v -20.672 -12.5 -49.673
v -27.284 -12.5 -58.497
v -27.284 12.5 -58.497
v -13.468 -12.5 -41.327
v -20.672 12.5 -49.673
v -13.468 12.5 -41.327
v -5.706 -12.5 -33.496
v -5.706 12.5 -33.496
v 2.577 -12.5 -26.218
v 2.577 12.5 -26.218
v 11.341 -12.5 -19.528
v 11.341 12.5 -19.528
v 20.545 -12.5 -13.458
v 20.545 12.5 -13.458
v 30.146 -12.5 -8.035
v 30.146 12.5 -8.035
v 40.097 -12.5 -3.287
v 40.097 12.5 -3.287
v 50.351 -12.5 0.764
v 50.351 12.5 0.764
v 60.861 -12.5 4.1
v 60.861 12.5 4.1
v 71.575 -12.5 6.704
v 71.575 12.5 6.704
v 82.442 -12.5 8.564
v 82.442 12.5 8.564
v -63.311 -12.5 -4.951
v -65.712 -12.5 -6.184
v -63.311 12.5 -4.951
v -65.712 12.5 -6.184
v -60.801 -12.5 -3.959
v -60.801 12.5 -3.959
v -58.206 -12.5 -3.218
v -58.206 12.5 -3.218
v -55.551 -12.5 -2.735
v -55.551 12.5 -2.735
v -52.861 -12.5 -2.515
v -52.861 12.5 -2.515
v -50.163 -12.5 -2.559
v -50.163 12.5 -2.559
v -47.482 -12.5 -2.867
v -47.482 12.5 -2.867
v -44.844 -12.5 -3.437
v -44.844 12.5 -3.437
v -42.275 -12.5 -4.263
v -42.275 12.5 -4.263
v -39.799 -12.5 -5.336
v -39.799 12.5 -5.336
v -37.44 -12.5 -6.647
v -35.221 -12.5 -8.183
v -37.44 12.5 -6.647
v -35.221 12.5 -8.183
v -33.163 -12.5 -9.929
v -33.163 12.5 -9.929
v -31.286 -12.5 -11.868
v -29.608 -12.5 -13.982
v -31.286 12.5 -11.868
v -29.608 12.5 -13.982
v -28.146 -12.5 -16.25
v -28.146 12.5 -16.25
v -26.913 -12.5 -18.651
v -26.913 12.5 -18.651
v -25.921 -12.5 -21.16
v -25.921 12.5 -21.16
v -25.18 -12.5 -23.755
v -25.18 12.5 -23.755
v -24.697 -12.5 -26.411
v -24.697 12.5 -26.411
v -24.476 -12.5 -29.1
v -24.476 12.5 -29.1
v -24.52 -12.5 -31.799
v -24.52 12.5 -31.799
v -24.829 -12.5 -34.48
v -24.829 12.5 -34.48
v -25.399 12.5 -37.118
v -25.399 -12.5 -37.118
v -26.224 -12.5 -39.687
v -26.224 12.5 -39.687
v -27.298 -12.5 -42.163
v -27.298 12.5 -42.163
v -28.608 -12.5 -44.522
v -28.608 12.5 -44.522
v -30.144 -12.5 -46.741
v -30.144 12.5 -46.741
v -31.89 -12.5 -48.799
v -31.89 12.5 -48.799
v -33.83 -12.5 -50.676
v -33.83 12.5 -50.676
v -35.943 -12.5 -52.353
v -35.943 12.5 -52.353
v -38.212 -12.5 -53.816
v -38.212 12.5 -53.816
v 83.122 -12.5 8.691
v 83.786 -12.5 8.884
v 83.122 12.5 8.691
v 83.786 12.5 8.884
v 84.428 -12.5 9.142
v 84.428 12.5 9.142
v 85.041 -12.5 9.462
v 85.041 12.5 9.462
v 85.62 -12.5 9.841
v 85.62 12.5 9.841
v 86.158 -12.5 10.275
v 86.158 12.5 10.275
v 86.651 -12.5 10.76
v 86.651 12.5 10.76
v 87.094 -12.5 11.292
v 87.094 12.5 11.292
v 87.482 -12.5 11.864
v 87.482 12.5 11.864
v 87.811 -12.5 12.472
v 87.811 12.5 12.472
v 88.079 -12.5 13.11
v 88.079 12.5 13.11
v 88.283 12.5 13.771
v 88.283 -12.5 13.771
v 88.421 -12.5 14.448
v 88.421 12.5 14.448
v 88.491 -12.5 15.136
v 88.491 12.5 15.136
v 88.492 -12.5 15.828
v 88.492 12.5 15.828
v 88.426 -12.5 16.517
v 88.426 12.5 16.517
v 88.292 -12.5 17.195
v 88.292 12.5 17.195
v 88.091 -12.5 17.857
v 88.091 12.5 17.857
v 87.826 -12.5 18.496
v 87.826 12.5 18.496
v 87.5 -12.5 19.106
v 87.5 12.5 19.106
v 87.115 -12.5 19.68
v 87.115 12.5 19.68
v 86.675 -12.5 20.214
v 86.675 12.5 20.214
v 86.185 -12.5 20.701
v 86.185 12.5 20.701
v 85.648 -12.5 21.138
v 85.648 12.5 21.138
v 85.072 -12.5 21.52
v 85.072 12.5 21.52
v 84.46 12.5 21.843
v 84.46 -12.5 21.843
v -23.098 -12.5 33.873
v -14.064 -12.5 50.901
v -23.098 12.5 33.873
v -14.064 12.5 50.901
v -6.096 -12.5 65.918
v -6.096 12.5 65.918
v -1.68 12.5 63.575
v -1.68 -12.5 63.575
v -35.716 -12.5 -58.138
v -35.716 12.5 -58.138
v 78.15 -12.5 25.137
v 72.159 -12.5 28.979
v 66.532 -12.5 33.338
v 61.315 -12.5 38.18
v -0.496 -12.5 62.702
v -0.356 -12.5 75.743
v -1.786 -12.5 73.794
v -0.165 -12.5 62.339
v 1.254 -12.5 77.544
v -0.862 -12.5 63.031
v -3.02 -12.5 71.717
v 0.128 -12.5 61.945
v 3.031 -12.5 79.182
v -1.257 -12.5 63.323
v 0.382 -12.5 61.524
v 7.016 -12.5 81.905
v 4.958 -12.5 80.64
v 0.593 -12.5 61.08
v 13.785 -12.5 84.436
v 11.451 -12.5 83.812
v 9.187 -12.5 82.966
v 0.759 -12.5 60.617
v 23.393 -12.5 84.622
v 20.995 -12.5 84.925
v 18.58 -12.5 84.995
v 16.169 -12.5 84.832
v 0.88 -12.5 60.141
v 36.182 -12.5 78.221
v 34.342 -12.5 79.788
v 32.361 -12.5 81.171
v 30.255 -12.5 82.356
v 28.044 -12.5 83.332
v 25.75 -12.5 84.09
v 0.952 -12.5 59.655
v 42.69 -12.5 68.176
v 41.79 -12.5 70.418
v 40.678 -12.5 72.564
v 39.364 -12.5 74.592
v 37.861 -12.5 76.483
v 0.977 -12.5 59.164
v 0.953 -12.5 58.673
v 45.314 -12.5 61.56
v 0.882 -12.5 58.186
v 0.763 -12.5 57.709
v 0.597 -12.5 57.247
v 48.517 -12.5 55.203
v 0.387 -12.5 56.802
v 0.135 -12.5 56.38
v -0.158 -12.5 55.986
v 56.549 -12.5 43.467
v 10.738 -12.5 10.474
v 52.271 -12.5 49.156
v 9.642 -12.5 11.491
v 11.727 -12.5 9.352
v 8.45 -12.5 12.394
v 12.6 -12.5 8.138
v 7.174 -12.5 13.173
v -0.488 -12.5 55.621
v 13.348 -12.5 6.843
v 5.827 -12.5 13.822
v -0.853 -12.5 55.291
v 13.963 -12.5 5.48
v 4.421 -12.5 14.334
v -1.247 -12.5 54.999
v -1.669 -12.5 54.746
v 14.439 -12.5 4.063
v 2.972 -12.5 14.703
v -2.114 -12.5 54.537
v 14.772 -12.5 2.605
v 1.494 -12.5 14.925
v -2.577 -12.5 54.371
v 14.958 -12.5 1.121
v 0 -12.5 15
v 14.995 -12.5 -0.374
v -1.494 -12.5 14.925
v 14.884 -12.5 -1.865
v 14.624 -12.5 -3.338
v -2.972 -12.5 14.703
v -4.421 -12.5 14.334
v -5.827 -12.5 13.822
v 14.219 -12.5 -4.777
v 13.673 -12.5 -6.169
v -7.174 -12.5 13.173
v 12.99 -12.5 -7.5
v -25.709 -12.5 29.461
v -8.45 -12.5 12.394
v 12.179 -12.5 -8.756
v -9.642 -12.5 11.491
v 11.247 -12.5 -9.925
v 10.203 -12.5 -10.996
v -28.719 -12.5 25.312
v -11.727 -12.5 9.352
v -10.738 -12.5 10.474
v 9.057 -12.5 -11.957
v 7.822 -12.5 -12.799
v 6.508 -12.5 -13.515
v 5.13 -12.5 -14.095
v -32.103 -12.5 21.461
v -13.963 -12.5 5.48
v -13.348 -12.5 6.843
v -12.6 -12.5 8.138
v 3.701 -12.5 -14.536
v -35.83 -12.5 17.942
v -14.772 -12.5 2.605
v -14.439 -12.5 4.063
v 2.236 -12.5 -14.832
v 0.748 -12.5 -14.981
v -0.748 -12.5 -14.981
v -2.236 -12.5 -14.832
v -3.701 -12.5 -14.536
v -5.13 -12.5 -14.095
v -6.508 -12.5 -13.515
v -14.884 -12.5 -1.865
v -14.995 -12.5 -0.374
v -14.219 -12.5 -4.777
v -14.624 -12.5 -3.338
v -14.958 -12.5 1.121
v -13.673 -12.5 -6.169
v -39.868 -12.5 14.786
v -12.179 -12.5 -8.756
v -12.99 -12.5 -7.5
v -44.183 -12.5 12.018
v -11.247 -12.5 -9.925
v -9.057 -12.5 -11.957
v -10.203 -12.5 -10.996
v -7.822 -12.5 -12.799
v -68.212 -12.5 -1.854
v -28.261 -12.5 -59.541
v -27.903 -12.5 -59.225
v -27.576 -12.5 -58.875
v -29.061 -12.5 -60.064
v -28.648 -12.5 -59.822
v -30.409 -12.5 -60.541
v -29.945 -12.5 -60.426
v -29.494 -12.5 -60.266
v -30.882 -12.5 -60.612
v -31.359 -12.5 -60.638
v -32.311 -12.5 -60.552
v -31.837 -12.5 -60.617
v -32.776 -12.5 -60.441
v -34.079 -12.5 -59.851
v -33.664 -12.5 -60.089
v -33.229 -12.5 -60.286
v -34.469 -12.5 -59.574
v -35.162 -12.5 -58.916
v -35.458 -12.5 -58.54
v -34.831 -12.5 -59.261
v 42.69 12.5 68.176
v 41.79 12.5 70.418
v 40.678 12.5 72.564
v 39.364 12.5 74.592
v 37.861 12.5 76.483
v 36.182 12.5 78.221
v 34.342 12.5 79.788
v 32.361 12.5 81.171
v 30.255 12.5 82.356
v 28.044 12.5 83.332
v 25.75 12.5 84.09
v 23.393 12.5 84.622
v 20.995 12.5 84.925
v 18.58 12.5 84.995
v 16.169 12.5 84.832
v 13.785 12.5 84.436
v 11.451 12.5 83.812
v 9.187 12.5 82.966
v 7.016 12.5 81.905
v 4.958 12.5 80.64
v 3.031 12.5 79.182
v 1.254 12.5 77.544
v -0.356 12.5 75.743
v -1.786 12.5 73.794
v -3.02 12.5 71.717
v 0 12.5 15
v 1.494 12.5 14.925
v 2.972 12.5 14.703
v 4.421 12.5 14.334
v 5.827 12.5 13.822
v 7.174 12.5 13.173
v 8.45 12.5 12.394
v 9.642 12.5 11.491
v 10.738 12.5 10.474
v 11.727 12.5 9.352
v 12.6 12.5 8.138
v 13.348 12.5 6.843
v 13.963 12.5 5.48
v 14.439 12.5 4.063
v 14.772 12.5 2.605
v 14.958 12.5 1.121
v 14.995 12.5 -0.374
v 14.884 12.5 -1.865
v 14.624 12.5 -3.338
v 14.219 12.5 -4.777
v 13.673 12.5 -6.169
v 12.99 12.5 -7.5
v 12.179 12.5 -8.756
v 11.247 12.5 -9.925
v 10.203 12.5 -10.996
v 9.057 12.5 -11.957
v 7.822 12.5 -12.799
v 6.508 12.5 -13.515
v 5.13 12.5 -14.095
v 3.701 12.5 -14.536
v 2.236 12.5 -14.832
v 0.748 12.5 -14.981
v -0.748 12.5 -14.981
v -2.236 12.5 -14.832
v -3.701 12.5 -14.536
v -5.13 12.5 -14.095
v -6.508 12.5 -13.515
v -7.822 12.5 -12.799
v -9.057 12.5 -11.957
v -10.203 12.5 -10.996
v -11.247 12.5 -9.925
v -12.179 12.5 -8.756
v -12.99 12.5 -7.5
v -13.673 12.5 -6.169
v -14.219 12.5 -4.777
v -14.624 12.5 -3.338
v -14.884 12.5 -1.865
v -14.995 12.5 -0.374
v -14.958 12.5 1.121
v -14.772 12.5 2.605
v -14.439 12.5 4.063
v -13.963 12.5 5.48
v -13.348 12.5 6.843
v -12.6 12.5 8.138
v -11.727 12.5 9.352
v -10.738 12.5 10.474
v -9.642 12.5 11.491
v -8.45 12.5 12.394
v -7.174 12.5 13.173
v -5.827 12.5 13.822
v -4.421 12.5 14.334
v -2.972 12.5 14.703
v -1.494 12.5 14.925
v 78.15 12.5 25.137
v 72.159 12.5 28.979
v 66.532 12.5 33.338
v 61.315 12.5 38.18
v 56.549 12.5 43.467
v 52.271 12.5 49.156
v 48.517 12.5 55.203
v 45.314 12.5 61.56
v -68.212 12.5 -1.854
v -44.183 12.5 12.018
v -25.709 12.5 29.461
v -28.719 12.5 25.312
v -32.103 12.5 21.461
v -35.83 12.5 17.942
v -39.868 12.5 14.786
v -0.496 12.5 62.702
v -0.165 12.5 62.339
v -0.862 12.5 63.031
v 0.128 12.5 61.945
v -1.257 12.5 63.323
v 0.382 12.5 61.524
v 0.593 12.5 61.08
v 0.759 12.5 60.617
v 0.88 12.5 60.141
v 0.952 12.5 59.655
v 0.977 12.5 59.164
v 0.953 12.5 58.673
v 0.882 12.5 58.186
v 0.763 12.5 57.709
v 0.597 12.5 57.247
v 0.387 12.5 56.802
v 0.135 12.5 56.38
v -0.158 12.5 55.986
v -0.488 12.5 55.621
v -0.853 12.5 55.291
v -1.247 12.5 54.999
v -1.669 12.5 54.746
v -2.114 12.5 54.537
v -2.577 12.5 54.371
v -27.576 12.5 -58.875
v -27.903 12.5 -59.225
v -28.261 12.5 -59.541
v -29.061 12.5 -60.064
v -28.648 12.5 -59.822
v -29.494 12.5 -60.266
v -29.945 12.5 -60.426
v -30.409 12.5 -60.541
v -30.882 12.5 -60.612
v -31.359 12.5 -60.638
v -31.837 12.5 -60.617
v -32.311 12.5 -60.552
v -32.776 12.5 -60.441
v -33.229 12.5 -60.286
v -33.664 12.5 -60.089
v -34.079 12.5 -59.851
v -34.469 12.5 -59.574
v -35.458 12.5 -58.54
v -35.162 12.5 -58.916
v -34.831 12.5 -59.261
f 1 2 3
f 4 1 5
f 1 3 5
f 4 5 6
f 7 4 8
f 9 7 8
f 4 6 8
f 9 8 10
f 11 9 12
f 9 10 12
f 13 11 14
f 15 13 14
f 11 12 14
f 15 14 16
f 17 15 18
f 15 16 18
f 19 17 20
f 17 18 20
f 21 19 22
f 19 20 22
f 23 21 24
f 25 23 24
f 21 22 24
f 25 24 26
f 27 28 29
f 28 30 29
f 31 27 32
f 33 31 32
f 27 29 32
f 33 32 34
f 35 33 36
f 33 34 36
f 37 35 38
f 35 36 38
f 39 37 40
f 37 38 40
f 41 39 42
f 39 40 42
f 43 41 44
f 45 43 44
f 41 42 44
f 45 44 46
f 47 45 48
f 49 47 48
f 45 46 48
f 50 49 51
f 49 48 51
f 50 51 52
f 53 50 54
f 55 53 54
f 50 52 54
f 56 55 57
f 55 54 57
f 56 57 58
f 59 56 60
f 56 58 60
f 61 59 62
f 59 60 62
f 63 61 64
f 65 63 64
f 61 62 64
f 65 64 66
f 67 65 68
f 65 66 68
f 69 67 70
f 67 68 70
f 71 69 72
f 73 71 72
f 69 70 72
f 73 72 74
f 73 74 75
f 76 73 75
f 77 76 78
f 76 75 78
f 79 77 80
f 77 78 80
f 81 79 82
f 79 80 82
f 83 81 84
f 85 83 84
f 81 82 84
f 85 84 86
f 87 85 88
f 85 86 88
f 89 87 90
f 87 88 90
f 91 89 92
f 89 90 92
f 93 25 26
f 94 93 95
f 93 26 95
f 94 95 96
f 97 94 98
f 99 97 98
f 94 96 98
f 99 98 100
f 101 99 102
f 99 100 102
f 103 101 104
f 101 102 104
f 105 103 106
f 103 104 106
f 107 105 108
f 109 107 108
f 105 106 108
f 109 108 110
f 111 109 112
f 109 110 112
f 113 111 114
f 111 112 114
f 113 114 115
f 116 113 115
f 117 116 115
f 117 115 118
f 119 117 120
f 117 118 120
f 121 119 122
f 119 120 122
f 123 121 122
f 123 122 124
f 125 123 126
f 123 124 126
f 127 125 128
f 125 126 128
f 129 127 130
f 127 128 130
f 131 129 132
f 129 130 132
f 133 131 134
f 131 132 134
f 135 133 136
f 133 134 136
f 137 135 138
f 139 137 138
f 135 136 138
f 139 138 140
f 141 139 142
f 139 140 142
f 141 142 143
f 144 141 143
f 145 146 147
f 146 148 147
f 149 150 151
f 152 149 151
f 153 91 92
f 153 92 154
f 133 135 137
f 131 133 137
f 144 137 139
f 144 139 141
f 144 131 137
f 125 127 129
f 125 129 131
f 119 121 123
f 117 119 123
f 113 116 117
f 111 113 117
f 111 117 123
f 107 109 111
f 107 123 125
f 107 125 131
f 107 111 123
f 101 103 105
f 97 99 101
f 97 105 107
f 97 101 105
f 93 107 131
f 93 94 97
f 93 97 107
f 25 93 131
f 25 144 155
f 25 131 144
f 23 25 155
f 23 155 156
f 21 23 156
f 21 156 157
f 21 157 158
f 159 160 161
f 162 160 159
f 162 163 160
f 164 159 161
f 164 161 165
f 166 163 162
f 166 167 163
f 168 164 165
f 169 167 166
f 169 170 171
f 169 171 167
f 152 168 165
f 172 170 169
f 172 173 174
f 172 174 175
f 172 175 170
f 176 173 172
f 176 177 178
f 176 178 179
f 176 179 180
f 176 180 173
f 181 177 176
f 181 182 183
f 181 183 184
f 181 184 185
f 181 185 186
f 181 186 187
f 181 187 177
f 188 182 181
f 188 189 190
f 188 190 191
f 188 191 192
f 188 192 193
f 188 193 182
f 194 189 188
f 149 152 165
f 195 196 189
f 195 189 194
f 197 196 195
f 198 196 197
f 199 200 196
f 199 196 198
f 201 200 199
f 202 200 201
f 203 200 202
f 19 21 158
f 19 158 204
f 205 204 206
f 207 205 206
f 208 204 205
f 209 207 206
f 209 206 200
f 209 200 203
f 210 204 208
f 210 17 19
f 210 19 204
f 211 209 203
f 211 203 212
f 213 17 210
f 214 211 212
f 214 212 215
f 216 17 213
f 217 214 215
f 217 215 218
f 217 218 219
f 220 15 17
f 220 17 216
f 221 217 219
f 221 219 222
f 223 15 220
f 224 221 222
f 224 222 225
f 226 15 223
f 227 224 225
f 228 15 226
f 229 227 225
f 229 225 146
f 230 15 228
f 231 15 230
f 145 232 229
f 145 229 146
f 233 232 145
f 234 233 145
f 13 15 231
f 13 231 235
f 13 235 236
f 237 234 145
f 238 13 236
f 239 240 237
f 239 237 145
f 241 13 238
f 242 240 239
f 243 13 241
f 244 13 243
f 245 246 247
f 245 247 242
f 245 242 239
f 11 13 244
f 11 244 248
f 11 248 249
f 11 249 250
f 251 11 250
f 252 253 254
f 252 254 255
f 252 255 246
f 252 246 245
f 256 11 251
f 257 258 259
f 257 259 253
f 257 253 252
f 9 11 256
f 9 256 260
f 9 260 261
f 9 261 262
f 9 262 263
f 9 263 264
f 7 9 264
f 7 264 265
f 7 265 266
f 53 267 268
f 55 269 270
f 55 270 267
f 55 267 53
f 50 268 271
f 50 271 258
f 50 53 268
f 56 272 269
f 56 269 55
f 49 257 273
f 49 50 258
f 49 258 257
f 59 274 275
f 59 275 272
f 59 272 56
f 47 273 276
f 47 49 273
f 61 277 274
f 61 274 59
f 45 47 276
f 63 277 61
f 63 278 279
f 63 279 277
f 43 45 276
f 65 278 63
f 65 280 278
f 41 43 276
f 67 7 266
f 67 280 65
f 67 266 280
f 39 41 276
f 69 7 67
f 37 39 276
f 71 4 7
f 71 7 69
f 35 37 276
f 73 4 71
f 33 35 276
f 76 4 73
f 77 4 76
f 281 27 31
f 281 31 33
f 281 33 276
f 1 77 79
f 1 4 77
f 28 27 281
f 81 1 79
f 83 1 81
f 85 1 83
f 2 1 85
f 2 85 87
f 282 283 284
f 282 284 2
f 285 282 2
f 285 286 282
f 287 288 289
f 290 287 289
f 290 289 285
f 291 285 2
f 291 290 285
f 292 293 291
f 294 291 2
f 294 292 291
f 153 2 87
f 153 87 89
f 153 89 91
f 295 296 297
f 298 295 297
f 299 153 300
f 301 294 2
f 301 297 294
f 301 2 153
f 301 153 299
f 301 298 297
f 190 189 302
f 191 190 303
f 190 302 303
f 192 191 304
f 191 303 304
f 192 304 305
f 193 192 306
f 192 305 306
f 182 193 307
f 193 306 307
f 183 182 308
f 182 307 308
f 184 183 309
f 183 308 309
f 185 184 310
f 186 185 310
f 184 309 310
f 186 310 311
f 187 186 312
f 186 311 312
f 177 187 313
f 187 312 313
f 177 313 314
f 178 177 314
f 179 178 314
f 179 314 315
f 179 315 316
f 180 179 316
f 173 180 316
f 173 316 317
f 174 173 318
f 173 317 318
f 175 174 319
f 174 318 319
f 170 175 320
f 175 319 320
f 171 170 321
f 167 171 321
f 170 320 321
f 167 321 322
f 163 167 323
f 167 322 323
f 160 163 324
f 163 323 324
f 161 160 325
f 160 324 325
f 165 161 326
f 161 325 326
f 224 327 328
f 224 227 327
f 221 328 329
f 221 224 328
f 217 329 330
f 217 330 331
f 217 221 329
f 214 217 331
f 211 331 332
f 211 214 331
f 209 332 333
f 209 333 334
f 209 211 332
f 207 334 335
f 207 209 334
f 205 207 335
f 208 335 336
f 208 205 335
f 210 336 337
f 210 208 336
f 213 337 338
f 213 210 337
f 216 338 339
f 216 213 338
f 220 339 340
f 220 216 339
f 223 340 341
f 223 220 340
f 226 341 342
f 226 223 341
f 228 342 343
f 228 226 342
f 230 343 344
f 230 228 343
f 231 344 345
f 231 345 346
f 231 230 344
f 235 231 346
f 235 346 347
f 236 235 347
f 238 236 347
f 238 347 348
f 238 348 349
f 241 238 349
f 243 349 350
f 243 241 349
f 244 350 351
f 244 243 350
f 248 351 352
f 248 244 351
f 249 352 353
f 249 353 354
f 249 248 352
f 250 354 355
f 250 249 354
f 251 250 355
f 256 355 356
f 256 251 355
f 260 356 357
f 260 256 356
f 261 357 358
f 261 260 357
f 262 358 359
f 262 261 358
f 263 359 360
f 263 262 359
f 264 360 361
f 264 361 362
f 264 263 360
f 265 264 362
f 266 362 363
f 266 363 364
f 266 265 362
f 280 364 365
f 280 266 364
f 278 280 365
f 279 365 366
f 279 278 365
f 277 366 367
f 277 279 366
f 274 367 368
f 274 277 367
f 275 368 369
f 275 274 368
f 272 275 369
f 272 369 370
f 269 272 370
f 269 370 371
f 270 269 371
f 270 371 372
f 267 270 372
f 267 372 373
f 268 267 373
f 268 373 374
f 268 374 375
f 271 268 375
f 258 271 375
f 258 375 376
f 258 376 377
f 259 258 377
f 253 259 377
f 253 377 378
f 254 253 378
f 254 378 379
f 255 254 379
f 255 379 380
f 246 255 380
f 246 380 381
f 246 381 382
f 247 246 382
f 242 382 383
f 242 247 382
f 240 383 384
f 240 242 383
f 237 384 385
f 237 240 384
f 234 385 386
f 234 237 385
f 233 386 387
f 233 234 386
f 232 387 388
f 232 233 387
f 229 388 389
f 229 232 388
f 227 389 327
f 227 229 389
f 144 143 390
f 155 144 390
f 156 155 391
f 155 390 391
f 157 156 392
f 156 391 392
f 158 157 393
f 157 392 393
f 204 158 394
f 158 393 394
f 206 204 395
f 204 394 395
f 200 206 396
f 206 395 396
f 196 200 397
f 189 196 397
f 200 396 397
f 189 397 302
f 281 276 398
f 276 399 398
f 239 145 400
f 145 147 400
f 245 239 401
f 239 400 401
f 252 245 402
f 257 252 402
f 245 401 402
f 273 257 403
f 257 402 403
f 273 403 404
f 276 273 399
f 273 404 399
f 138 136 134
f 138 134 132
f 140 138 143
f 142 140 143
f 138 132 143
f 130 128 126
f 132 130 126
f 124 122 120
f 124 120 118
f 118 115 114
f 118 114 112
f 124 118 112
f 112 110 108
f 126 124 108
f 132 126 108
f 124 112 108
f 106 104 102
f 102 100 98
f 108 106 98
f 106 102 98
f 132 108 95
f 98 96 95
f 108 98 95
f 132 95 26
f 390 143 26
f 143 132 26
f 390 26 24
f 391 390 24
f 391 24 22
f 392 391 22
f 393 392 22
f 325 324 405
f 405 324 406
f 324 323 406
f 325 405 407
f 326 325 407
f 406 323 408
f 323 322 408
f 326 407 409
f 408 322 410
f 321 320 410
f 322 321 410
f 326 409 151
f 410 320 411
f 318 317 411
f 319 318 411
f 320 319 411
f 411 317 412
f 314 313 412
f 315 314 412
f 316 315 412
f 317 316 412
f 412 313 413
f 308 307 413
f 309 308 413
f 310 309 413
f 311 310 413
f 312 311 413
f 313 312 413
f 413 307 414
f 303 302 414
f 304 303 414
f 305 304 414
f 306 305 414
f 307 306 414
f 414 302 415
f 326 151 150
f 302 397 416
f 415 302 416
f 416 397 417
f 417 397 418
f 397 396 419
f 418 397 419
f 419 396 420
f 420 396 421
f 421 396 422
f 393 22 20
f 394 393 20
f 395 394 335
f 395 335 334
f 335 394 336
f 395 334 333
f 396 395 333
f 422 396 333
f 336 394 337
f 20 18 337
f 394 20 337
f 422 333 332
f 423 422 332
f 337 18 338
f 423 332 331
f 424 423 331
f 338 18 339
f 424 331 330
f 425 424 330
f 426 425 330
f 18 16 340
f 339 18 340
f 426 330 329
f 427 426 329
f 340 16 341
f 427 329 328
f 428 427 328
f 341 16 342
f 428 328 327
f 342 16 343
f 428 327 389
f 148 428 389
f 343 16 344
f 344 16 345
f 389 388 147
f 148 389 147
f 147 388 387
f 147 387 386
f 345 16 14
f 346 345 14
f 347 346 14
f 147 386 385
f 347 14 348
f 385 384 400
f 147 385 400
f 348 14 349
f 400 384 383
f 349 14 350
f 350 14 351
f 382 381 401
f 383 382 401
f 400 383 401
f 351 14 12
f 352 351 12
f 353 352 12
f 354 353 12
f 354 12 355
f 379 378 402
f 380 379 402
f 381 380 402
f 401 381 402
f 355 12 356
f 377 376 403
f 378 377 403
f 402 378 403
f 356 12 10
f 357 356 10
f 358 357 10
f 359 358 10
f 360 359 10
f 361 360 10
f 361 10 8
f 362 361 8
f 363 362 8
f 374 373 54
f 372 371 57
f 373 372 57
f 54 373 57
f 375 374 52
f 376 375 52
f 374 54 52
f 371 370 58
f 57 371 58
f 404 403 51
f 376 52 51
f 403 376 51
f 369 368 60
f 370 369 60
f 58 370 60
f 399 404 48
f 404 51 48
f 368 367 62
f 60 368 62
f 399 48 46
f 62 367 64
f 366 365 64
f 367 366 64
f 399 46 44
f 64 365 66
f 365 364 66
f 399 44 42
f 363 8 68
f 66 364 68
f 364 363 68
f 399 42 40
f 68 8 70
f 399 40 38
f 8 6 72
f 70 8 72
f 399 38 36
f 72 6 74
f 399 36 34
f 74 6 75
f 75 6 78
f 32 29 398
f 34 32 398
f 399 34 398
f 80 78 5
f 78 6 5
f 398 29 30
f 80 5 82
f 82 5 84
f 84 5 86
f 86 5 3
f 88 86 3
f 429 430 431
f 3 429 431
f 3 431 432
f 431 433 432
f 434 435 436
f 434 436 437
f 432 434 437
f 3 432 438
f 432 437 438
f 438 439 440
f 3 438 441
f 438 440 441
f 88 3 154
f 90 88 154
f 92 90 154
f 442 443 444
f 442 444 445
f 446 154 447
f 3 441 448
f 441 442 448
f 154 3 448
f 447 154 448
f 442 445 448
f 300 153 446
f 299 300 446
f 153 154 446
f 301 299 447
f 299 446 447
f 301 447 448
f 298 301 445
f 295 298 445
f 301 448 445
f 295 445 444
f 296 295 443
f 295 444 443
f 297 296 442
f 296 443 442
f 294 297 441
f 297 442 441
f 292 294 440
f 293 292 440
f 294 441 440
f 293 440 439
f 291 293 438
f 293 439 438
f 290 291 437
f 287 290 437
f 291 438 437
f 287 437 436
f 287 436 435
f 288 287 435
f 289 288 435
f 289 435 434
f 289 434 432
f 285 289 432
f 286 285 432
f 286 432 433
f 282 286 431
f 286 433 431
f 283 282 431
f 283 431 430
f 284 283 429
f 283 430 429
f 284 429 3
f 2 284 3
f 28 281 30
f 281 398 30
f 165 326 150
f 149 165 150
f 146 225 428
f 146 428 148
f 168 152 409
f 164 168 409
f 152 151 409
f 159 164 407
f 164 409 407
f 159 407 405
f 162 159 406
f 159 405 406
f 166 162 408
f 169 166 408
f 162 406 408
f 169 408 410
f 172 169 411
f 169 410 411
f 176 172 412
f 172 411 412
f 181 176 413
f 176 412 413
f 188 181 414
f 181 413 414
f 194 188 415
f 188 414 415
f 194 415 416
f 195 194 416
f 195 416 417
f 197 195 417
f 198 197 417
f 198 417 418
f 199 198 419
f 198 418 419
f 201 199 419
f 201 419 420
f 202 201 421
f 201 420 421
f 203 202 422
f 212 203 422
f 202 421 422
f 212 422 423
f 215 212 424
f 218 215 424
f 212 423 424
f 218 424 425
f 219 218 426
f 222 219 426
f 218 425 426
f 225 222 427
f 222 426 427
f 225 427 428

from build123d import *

# Parameters (mm, degrees)
SKETCH_1_R      = 15
EXTRUDE_1_DEPTH = 12.5
FILLET_1_R      = 5


with BuildPart() as part:
    # 草图1 → 凸台-拉伸1 (new, symmetric)
    with BuildSketch(Plane(origin=(0, 0, 0), x_dir=(1, 0, 0), z_dir=(0, 1, 0))):
        with BuildLine():
            Line((-6.096427139, -65.918001187), (-1.679569826, -63.574633635))
            ThreePointArc((-1.679569826, -63.574633635), (0.953470582, -58.672633233), (-2.576772207, -54.371482736))
            Line((-2.576772207, -54.371482736), (-14.063876814, -50.900686325))
            Line((-14.063876814, -50.900686325), (-23.098048547, -33.872778153))
            ThreePointArc((-23.098048547, -33.872778153), (-32.102531801, -21.461490279), (-44.183478984, -12.018424012))
            Line((-44.183478984, -12.018424012), (-68.211524227, 1.854174377))
            Line((-68.211524227, 1.854174377), (-65.711524227, 6.184301396))
            ThreePointArc((-65.711524227, 6.184301396), (-28.145825623, 16.25), (-38.211524227, 53.815698604))
            Line((-38.211524227, 53.815698604), (-31.672954916, 65.14083286))
            ThreePointArc((-31.672954916, 65.14083286), (17.174057589, 15.576162499), (82.442373664, -8.563723486))
            ThreePointArc((82.442373664, -8.563723486), (88.420562961, -14.448425798), (84.460192724, -21.843284562))
            ThreePointArc((84.460192724, -21.843284562), (58.872866338, -40.770350543), (42.68980144, -68.175706017))
            ThreePointArc((42.68980144, -68.175706017), (20.995404286, -84.925315775), (-3.01984927, -71.716837758))
            Line((-3.01984927, -71.716837758), (-6.096427139, -65.918001187))
        make_face()
        with Locations(Location((0, 0, 0), (0, 0, 270))):
            Circle(SKETCH_1_R, mode=Mode.SUBTRACT)
    extrude(amount=EXTRUDE_1_DEPTH, both=True)

    # 圆角1
    fillet_1_edges = [part.edges().sort_by_distance(p)[0] for p in [
        (-31.672954916, 0, -65.14083286),
    ]]
    fillet(fillet_1_edges, radius=FILLET_1_R)


solid = part.part
